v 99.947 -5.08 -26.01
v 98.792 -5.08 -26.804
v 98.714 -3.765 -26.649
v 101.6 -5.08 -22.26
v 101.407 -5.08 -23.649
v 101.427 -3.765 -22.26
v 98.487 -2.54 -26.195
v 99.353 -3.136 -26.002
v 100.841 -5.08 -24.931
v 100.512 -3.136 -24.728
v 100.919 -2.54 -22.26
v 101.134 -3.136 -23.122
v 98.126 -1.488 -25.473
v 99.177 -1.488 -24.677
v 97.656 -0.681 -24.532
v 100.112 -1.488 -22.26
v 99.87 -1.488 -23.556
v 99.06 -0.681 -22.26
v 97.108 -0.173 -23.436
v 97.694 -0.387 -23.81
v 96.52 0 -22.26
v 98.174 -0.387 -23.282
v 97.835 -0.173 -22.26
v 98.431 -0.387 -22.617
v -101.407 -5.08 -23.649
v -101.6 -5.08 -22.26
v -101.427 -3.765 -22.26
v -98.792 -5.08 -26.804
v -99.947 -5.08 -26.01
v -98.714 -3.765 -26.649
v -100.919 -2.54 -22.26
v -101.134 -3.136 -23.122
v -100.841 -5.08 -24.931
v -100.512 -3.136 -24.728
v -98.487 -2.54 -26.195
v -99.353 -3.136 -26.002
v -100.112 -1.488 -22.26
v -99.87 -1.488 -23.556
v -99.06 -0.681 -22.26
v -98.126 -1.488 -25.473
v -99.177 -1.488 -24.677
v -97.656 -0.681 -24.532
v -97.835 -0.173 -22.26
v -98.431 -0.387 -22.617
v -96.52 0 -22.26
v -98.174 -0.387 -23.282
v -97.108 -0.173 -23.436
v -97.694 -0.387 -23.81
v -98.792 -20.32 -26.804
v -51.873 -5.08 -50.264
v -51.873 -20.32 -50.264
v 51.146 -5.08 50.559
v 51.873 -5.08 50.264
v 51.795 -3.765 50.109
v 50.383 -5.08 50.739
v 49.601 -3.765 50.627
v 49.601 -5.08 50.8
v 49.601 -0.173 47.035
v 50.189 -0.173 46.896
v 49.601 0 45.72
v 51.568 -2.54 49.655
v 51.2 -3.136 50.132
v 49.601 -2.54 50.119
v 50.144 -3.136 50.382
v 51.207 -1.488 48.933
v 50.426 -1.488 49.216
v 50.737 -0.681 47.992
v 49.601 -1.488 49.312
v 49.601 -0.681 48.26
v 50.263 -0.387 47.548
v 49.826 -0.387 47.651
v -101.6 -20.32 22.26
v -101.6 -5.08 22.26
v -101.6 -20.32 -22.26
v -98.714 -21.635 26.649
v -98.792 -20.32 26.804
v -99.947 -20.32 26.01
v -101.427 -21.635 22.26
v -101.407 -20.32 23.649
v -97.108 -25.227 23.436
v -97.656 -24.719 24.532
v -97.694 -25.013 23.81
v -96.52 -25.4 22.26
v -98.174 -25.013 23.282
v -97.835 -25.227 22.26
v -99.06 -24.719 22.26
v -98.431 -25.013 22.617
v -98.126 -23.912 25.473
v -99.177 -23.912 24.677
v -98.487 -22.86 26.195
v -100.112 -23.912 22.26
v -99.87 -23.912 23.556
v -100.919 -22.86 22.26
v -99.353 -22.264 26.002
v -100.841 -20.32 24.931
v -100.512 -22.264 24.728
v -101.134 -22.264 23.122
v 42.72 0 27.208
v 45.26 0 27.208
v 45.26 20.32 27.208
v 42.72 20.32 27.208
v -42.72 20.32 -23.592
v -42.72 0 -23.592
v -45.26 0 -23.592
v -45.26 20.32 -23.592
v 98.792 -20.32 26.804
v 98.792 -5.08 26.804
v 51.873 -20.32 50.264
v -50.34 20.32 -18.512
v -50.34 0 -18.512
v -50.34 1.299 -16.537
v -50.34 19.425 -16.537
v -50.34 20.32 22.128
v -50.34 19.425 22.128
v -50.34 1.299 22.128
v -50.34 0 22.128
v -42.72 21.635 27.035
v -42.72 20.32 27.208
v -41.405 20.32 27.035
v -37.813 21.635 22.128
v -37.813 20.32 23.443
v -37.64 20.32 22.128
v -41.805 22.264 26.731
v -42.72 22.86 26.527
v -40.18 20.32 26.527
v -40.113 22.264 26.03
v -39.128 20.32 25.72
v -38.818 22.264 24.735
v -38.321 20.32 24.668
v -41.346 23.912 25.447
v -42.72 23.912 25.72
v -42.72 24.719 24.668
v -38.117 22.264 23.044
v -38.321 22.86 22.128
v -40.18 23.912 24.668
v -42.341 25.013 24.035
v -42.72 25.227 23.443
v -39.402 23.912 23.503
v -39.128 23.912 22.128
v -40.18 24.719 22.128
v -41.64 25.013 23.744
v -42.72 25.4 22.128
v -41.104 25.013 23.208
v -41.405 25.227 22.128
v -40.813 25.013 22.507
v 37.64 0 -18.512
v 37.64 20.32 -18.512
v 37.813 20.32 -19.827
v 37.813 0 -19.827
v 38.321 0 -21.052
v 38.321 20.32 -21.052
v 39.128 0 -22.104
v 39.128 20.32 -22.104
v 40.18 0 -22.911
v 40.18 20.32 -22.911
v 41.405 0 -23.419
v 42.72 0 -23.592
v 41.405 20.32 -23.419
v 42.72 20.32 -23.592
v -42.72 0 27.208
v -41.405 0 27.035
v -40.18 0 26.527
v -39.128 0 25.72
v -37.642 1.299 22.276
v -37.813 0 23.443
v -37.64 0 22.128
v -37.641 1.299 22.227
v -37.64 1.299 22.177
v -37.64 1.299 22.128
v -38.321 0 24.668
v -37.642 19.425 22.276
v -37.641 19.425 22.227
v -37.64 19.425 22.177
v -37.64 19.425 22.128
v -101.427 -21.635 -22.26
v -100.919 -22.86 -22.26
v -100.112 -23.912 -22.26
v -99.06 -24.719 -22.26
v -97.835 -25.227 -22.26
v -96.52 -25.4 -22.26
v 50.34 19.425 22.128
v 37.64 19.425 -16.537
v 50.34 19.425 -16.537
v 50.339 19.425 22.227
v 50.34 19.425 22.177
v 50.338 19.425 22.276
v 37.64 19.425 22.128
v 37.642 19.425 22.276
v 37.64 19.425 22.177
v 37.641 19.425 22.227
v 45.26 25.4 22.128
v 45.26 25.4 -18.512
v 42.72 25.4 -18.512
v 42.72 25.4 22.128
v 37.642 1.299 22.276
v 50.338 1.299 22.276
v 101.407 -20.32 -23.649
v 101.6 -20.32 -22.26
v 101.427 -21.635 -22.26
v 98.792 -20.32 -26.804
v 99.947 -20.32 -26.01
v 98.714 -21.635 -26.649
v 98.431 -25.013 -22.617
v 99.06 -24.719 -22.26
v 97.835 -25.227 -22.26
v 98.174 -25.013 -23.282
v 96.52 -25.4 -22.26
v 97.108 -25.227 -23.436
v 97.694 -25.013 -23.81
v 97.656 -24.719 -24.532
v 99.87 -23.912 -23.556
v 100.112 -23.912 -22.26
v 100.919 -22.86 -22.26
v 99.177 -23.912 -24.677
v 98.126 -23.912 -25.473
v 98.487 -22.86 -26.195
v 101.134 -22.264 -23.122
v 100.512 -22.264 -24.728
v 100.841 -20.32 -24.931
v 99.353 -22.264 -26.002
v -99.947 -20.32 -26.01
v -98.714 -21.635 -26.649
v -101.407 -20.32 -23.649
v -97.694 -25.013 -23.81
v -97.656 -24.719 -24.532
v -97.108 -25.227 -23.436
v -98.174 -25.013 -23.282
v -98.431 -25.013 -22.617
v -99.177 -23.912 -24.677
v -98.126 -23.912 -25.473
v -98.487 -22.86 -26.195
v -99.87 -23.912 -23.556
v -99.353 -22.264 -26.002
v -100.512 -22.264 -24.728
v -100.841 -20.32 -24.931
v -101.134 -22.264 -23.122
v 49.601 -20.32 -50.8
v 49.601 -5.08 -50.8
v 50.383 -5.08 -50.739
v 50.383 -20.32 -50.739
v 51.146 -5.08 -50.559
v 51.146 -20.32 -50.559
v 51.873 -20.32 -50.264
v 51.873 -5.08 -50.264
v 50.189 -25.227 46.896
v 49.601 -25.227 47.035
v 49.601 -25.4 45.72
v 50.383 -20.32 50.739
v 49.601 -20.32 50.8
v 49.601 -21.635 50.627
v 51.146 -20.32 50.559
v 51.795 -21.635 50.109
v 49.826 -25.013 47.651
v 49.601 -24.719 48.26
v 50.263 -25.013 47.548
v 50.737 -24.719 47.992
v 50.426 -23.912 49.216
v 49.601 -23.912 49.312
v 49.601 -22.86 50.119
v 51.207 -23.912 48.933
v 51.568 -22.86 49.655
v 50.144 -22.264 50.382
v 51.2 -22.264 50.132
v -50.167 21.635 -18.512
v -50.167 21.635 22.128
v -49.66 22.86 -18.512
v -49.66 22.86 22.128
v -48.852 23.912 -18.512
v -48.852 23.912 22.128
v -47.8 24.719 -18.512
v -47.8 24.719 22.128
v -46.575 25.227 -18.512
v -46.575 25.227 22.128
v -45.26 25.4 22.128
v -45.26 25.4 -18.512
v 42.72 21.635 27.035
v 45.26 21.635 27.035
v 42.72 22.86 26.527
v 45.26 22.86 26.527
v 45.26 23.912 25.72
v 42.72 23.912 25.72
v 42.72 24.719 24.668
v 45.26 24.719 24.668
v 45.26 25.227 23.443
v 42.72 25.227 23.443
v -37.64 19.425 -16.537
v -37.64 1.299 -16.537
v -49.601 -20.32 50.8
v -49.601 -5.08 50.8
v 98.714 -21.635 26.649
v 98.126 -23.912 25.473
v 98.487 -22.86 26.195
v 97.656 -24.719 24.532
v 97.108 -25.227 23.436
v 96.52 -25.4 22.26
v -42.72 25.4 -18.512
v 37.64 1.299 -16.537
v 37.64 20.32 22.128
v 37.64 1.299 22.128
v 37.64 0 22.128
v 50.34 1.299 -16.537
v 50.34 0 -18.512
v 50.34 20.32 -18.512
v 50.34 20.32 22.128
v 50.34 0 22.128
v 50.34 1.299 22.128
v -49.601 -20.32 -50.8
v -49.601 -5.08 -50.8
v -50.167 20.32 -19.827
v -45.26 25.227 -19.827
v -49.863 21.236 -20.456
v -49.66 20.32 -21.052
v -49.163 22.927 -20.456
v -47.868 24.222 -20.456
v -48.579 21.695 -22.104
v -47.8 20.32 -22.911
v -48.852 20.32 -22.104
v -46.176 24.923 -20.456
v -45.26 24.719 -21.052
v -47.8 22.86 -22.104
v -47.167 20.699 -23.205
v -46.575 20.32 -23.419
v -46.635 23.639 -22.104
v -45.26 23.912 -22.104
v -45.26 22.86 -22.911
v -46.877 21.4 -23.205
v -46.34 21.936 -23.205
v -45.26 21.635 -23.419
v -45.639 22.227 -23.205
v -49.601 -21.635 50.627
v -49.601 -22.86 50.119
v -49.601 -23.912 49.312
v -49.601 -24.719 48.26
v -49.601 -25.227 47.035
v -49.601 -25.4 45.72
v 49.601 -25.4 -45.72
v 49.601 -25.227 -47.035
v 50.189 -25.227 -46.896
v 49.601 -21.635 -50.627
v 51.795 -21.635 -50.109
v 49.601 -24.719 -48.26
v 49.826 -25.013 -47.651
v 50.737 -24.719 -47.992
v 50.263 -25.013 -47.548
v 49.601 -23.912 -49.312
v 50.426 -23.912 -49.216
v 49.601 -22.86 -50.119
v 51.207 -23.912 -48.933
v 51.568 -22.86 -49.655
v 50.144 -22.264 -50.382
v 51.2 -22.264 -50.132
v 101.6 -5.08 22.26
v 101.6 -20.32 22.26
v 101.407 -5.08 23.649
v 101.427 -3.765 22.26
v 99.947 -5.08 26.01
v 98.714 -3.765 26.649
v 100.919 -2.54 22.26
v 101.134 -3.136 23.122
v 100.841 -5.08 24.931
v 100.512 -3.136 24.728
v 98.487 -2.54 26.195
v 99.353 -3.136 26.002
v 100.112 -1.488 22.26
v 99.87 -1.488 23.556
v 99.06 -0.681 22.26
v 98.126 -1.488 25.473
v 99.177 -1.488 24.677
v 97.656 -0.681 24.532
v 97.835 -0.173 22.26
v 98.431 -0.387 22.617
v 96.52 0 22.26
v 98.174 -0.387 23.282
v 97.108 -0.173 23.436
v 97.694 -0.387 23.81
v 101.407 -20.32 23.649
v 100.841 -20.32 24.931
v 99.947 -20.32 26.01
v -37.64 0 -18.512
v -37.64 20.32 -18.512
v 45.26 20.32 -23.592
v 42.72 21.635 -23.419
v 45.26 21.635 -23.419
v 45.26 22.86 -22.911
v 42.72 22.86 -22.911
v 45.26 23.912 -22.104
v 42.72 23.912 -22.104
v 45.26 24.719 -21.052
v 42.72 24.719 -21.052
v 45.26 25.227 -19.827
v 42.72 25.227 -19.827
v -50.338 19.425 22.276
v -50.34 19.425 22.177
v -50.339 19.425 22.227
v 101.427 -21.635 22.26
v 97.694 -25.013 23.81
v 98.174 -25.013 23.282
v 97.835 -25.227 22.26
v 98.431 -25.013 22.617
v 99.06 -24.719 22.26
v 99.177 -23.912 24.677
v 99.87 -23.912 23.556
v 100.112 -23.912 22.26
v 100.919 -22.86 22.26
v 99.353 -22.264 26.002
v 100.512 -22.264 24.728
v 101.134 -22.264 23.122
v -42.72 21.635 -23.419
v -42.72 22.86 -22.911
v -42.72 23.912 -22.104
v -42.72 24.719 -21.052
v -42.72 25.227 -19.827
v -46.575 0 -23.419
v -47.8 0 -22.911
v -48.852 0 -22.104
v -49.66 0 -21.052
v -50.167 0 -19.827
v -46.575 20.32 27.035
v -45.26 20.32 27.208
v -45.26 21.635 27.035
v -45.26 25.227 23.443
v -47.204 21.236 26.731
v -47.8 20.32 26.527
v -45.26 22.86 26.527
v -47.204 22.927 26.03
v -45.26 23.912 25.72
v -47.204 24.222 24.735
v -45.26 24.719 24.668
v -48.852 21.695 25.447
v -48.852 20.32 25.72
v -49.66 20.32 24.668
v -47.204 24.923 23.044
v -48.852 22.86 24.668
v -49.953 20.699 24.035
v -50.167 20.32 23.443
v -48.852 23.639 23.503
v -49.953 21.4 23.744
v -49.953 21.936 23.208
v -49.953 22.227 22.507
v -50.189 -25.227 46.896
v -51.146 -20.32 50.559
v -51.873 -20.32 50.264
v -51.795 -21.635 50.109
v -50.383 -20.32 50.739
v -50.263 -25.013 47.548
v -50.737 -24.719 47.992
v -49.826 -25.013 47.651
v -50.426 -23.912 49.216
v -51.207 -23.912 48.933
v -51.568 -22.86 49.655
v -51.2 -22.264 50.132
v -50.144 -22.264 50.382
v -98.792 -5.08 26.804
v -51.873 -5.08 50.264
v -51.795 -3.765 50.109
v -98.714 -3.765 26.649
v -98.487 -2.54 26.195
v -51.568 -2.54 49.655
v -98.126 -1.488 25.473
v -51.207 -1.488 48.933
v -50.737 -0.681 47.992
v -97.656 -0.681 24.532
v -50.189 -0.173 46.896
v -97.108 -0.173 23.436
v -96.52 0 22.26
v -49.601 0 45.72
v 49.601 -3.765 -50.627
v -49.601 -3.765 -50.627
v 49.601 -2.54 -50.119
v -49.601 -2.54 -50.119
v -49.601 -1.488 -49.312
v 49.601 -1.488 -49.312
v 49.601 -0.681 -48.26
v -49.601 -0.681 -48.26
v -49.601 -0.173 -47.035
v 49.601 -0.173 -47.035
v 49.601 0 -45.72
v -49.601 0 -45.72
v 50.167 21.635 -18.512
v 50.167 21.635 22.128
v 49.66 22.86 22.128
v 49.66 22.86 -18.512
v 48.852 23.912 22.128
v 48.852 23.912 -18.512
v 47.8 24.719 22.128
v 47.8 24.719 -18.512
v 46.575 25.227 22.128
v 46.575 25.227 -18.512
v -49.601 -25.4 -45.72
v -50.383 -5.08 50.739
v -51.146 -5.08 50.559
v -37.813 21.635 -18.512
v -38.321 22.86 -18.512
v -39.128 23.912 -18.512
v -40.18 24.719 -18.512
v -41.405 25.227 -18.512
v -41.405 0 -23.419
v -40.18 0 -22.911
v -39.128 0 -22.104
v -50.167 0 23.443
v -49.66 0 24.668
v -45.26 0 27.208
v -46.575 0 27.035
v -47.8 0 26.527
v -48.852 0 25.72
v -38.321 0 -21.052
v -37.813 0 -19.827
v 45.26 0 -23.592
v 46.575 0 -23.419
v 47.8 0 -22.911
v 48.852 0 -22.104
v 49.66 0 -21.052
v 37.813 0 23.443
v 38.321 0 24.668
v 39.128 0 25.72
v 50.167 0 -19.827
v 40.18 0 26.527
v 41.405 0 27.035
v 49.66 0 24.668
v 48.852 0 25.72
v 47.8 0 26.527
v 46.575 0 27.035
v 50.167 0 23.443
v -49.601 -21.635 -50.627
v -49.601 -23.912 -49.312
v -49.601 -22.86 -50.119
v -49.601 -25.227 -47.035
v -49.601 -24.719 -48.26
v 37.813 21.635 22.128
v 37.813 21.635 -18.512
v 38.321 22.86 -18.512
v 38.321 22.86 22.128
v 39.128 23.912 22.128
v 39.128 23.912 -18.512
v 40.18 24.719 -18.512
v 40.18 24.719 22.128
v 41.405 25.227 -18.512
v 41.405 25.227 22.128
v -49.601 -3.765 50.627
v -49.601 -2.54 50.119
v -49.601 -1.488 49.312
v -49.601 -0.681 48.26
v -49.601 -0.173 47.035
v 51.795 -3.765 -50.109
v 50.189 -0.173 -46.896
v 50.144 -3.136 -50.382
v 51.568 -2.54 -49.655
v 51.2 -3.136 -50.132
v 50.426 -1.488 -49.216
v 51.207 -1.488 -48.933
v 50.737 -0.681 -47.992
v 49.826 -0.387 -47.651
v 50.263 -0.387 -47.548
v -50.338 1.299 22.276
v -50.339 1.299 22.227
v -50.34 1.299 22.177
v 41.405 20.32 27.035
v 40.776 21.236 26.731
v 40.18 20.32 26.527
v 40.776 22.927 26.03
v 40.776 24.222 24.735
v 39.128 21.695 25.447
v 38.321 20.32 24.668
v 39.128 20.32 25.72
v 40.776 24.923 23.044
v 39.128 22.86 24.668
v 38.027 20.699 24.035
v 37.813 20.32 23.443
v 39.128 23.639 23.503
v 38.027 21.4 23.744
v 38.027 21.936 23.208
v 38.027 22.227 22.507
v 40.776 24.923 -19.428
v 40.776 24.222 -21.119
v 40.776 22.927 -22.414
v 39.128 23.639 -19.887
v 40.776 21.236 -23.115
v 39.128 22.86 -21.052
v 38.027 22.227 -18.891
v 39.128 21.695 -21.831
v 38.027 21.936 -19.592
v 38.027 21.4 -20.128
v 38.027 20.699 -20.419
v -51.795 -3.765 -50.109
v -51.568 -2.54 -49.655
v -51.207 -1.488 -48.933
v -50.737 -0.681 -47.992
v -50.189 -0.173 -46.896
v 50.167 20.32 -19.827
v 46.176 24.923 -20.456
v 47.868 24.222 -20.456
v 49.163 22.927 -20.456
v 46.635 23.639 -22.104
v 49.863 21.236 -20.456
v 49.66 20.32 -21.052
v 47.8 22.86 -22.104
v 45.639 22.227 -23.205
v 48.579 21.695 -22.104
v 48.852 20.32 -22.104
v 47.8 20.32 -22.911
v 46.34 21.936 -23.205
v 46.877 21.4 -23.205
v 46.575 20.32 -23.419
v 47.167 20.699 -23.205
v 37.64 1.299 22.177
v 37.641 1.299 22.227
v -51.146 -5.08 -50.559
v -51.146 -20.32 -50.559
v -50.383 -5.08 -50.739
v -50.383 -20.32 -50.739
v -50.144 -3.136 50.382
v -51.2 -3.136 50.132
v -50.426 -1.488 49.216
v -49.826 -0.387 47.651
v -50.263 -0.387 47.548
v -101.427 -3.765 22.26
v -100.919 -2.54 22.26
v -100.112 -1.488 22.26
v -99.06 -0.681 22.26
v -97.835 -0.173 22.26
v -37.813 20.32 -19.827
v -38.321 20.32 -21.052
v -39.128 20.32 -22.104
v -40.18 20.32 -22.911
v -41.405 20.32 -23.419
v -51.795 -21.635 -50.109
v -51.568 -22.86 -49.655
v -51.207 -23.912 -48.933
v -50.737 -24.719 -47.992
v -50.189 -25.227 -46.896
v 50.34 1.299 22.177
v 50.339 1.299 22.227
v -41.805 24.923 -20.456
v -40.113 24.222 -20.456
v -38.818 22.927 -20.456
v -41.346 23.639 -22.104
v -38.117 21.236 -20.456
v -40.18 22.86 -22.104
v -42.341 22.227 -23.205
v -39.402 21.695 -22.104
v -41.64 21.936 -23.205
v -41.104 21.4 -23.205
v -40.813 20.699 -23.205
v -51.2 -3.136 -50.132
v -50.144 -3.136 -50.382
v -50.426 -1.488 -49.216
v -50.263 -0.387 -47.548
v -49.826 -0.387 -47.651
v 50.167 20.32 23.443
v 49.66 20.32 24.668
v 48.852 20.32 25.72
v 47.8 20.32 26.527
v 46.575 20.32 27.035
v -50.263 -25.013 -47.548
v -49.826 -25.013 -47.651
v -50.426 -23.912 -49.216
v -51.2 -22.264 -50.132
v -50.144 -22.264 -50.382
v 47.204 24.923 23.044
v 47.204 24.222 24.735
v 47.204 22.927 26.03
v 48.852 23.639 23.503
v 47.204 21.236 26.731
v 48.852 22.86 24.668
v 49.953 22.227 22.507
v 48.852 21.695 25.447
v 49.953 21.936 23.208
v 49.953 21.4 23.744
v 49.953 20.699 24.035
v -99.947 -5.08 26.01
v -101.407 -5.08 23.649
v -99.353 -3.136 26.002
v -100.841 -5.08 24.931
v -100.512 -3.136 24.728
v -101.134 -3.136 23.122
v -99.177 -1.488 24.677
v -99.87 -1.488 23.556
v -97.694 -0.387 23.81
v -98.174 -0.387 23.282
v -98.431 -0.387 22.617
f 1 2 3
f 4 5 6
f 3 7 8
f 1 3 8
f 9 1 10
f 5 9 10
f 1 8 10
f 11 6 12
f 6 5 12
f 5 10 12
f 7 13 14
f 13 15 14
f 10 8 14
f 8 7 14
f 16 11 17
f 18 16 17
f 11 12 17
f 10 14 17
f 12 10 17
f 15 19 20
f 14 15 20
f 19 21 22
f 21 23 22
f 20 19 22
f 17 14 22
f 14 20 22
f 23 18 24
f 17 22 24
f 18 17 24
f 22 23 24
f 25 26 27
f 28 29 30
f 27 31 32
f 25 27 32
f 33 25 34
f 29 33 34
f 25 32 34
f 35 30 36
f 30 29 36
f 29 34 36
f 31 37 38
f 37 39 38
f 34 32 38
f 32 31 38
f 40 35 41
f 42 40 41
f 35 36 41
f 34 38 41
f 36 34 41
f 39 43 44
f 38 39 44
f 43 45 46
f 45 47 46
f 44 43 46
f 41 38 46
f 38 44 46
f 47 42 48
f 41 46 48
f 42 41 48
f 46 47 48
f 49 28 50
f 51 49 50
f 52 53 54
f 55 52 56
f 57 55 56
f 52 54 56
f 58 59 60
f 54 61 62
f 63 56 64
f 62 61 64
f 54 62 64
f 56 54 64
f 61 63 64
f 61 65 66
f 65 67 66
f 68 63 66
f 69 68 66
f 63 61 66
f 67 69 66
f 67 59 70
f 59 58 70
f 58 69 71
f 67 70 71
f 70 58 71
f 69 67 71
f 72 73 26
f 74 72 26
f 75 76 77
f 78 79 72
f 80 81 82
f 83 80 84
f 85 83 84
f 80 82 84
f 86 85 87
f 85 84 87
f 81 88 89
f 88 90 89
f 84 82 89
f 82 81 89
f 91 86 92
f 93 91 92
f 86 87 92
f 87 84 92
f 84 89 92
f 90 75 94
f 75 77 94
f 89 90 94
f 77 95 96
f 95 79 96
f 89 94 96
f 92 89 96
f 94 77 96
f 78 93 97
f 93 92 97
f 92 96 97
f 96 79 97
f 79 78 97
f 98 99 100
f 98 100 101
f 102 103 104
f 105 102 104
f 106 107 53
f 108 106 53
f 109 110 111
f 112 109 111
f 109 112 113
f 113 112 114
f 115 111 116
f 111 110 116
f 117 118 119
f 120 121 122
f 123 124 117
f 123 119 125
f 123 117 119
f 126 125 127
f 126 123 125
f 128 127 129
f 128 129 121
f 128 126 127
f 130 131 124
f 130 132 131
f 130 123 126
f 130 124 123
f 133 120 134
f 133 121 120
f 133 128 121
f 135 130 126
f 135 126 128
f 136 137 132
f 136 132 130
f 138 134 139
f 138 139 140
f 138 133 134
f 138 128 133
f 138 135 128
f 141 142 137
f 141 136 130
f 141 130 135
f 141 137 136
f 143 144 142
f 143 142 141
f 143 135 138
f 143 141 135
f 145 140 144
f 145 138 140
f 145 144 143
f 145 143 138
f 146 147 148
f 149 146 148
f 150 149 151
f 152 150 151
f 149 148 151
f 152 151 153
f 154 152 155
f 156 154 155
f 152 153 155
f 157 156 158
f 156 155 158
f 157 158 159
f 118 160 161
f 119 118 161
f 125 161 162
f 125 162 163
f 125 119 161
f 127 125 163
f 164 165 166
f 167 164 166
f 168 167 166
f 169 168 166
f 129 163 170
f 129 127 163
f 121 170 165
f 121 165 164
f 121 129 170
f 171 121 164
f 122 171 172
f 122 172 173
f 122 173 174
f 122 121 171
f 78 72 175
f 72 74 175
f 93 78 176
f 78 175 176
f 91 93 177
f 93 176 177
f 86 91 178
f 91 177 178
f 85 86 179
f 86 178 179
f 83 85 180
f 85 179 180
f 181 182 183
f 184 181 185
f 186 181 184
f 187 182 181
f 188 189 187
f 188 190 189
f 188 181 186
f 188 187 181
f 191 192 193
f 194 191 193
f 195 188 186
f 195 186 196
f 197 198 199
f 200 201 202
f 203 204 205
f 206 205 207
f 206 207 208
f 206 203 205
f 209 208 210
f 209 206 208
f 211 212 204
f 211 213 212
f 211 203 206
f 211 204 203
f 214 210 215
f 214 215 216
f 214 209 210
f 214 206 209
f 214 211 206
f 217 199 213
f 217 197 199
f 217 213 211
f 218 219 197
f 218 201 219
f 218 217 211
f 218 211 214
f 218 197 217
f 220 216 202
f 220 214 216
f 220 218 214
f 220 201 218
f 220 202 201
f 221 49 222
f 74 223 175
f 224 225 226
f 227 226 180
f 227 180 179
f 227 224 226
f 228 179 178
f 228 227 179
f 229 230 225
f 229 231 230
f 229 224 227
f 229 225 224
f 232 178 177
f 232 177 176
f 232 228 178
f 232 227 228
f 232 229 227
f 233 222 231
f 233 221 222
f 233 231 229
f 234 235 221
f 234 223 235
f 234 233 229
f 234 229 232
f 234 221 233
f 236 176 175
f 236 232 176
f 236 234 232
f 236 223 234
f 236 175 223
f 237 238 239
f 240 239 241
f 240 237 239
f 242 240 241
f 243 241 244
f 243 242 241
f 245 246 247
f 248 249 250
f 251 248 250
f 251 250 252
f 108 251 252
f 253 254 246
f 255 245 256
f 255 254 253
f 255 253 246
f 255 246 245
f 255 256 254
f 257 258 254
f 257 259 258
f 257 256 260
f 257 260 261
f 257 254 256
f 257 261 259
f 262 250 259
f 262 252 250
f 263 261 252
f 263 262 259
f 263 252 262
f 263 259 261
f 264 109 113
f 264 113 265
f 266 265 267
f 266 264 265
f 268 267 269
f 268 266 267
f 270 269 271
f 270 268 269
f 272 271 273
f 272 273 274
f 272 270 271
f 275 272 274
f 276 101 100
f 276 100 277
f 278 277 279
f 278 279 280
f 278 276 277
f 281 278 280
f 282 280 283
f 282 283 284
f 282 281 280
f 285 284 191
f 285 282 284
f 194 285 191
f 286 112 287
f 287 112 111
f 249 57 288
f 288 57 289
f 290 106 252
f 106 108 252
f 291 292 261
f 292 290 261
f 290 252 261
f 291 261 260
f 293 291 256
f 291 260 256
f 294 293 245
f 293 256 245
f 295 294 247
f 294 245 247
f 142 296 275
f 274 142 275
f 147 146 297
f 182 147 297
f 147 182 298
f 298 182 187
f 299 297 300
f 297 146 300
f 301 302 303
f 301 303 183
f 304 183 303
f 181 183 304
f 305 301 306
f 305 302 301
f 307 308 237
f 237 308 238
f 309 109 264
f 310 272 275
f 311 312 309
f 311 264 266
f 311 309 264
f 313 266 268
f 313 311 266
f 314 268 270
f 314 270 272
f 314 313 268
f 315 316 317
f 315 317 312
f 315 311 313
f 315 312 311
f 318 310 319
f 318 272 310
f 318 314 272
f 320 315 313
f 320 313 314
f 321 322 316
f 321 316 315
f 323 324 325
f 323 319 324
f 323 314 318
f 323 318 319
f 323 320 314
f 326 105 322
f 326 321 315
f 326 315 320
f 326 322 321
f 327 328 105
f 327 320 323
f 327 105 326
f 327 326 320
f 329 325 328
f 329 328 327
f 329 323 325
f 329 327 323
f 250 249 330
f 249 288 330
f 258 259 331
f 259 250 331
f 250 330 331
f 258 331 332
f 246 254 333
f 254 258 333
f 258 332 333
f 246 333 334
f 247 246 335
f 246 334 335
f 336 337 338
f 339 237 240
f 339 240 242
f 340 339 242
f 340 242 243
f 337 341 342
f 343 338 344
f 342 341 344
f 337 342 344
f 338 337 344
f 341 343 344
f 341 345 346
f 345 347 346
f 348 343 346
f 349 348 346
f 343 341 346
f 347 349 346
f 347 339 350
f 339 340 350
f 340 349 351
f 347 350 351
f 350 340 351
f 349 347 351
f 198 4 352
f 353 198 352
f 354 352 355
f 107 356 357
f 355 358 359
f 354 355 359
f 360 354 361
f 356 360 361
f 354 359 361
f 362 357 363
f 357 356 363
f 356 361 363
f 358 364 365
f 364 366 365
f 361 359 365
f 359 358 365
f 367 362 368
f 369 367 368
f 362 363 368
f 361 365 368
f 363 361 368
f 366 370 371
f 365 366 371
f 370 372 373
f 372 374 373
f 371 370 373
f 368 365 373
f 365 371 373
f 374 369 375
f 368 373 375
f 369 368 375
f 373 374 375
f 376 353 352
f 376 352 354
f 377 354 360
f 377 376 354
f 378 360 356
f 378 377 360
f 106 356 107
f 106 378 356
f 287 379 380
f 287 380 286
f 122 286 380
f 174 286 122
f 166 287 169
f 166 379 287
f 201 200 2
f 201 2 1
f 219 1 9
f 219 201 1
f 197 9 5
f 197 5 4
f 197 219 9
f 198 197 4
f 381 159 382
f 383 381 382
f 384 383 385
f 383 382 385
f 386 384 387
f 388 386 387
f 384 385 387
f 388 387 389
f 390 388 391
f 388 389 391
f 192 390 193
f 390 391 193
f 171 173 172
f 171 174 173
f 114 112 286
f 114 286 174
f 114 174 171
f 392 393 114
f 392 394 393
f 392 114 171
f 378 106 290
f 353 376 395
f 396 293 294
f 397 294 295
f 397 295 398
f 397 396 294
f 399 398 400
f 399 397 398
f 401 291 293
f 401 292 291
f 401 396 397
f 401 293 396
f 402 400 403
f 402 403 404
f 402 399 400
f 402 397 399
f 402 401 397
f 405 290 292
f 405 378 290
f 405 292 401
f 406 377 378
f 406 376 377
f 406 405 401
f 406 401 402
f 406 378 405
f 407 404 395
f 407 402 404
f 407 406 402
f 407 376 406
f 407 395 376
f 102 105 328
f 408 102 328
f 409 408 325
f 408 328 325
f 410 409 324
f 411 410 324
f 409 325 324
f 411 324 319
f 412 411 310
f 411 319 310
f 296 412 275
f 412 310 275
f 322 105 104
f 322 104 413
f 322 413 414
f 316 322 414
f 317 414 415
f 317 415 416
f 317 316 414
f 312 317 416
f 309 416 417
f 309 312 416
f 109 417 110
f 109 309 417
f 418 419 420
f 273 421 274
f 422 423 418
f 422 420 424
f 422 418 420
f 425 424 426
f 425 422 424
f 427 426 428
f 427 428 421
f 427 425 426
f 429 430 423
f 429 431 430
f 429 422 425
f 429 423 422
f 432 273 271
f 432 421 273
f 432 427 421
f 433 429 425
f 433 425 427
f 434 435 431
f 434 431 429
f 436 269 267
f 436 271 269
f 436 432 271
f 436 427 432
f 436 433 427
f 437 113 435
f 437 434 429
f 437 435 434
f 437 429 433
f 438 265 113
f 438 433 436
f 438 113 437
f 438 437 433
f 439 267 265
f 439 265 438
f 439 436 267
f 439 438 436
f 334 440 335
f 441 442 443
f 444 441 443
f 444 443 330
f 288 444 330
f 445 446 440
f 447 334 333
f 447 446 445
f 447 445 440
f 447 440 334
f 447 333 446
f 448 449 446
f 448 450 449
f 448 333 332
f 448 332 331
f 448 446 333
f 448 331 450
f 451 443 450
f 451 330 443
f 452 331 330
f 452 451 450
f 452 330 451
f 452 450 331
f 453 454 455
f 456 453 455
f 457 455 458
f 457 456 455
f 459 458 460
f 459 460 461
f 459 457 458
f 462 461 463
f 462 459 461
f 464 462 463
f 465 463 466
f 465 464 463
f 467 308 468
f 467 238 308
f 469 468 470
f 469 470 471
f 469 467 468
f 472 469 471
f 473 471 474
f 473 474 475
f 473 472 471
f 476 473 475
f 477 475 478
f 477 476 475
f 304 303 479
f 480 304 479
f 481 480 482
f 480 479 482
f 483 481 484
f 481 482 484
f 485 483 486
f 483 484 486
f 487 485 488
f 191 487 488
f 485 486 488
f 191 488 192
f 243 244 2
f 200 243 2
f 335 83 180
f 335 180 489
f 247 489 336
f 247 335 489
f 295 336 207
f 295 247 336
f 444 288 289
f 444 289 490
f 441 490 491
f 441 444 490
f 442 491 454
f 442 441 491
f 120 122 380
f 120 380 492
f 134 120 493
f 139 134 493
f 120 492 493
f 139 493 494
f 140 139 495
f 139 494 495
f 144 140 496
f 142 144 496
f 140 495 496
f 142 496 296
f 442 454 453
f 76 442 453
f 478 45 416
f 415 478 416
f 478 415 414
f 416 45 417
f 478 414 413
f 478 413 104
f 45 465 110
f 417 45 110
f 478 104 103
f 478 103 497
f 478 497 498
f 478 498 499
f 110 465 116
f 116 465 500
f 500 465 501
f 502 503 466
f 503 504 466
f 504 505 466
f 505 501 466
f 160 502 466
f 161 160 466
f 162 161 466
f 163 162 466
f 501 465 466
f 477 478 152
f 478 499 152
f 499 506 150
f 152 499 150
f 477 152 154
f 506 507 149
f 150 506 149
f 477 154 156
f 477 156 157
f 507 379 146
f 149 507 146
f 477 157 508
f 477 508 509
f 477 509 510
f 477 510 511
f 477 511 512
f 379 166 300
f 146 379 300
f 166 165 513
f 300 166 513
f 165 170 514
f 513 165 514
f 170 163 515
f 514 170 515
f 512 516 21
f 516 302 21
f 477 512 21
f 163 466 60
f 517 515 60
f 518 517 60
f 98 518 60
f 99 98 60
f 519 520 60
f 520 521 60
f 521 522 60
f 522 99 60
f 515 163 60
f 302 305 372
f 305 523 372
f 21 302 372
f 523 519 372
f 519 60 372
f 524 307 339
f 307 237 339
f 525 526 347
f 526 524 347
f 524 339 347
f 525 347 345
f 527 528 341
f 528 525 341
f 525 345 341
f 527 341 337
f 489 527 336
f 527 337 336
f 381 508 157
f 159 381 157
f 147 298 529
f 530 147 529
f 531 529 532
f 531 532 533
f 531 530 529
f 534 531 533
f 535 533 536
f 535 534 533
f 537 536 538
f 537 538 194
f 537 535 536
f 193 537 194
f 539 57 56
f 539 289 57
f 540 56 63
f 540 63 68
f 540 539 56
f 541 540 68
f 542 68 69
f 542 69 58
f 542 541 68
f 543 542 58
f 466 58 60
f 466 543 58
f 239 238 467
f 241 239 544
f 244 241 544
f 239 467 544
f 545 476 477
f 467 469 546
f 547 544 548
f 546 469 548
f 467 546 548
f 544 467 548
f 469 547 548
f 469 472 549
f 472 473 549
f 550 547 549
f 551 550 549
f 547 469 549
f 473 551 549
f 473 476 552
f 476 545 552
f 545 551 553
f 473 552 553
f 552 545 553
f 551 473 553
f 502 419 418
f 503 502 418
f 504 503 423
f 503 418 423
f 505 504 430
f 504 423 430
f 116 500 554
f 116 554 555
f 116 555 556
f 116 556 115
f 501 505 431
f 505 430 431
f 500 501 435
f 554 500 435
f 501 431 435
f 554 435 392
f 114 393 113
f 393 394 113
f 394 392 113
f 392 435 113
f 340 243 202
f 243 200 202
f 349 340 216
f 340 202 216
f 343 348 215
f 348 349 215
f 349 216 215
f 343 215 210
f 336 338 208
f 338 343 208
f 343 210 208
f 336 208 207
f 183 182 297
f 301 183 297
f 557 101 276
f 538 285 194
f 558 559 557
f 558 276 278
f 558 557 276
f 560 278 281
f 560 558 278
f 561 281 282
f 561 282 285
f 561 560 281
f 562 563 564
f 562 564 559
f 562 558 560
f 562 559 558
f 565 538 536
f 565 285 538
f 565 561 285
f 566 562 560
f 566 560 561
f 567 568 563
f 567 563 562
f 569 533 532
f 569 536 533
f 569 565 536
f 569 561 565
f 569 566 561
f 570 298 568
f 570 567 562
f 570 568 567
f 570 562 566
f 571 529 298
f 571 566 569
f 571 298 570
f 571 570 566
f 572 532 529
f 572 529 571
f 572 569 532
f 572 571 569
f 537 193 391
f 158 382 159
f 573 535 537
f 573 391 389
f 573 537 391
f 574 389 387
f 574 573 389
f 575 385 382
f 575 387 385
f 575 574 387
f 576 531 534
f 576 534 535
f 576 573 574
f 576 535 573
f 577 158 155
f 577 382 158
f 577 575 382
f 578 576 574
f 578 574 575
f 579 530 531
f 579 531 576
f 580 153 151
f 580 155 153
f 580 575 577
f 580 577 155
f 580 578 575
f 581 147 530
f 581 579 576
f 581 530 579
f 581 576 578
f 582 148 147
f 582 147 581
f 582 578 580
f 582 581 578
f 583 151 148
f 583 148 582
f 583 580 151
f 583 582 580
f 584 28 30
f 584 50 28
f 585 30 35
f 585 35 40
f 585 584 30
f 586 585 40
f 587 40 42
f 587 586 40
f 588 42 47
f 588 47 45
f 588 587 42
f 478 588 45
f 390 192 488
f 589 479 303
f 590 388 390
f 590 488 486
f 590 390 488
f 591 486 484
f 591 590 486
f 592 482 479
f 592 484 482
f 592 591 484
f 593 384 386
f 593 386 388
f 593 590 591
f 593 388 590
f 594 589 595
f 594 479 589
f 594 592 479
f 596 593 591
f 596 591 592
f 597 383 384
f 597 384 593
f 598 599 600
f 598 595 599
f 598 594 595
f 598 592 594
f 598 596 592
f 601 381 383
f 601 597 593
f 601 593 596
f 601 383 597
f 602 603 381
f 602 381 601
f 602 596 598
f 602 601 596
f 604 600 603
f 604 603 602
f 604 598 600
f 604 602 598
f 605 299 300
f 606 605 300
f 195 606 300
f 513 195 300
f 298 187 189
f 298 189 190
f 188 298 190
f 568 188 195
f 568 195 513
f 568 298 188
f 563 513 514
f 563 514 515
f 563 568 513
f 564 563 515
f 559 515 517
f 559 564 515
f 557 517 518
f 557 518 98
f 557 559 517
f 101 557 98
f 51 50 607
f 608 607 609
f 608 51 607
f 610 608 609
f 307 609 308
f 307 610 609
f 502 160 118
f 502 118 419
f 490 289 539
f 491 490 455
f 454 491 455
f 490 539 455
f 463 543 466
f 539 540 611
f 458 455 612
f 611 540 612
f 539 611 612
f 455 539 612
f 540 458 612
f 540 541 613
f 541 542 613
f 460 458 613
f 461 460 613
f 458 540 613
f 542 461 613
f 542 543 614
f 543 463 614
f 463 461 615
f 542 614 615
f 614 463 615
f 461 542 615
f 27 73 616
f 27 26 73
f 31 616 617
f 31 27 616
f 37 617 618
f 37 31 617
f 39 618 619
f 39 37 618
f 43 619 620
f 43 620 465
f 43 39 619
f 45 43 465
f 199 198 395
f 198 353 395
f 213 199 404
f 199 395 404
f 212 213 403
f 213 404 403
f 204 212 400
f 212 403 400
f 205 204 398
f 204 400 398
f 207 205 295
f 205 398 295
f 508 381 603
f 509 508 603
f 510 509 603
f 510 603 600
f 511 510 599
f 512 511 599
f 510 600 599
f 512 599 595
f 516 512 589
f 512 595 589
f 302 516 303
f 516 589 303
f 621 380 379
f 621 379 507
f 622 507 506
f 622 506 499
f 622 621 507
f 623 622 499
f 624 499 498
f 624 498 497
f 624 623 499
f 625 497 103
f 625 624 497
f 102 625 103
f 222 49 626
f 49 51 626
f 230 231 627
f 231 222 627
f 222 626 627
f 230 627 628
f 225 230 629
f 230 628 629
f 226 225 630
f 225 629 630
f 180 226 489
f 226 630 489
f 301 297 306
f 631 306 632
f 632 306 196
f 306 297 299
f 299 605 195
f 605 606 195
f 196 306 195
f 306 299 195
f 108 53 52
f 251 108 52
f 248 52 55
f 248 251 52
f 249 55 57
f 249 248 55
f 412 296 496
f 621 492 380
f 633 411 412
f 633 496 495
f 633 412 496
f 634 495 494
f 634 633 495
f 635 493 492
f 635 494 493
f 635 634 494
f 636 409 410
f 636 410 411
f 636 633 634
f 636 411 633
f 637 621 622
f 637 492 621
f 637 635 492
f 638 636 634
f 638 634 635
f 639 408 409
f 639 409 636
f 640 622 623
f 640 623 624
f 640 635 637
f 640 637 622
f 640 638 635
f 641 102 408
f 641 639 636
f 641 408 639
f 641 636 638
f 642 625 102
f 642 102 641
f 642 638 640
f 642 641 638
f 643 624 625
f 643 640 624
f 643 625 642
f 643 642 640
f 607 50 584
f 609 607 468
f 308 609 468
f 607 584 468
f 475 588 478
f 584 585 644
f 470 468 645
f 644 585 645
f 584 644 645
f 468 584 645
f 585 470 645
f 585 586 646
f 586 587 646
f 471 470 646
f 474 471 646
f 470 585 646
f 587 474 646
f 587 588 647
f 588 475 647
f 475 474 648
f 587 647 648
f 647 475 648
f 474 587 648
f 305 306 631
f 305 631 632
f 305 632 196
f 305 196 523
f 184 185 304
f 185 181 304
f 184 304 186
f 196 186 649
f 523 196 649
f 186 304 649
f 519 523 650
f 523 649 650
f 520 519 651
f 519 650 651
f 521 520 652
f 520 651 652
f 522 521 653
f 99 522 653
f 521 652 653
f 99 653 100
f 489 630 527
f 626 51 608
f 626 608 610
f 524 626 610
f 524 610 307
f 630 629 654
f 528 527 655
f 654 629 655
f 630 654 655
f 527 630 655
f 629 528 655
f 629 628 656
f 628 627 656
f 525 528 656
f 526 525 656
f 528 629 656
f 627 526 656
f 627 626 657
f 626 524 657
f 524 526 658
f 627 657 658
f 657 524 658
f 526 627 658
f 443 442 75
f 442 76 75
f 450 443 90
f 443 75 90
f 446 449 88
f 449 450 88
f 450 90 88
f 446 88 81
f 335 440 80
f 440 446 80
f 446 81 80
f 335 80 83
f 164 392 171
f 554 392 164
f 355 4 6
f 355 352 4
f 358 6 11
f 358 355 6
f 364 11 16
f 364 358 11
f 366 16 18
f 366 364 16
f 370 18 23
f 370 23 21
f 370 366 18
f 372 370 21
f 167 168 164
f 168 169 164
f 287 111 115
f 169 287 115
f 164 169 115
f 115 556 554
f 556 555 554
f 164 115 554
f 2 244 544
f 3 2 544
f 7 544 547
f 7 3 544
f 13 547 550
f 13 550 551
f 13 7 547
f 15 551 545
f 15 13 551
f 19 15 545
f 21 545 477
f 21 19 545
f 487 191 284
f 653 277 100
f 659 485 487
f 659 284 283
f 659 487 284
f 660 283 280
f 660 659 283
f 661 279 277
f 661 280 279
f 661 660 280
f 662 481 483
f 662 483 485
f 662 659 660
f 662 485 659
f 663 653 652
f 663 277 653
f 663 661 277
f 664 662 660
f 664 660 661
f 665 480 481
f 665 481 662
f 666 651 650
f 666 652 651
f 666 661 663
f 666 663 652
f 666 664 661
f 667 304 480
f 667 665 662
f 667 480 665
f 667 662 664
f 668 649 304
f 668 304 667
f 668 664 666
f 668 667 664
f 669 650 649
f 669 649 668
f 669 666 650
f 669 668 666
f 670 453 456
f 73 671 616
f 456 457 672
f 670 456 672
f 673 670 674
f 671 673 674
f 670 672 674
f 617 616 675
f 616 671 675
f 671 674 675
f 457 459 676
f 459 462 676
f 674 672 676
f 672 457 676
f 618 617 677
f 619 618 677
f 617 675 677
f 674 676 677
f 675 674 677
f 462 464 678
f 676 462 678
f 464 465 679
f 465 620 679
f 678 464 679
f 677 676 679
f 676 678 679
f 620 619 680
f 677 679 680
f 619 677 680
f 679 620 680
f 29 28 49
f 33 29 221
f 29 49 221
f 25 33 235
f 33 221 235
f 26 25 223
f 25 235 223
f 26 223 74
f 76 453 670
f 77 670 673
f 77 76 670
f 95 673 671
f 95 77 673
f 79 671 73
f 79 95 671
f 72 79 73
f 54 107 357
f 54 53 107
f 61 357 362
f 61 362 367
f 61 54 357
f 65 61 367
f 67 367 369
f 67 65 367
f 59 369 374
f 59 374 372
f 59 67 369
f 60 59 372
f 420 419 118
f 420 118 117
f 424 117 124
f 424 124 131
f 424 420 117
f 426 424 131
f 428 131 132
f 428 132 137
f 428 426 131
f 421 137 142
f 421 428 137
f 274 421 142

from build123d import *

# Parameters (mm, degrees)
F1_DEPTH     = 25.4
F2_R         = 5.08
F3_R         = 5.08
F4_W         = 12.7
F4_H         = 50.8
F5_DEPTH     = 25.4
F6_W         = 18.1257220684
F6_H         = 38.8130061328
F7_DEPTH     = 254
F8_T1_DEPTH  = 2.54
F8_T3_DEPTH  = 40.64
F8_T5_DEPTH  = 20.32
F8_S9_W      = 5.08
F8_S9_H      = 5.08
F8_T10_DEPTH = 5.08
F8_S15_W     = 5.08
F8_S15_H     = 5.08
F8_T16_DEPTH = 5.08
F8_S21_W     = 5.08
F8_S21_H     = 5.08
F8_T22_DEPTH = 5.08
F8_S27_W     = 5.08
F8_S27_H     = 5.08
F8_T28_DEPTH = 5.08
F9_T1_DEPTH  = 40.64
F9_T3_DEPTH  = 2.54
F9_T5_DEPTH  = 20.32
F9_S9_W      = 5.08
F9_S9_H      = 5.08
F9_T10_DEPTH = 5.08
F9_S15_W     = 5.08
F9_S15_H     = 5.08
F9_T16_DEPTH = 5.08
F9_S21_W     = 5.08
F9_S21_H     = 5.08
F9_T22_DEPTH = 5.08
F9_S27_W     = 5.08
F9_S27_H     = 5.08
F9_T28_DEPTH = 5.08


# Not quite as in the source:
# - a fillet or chamfer that OpenCascade refuses, or shapes differently, is made with other operations: its cross-section is extruded or revolved along the edge and cut away or added


with BuildPart() as f1:
    # F0 (on Front) → F1 (new body)
    with BuildSketch(Plane.XZ):
        Polygon((-101.6, -25.4), (-50.8, -50.8), (50.8, -50.8), (101.6, -25.4), (101.6, 25.4), (50.8, 50.8), (-50.8, 50.8), (-101.6, 25.4), align=None)
    extrude(amount=F1_DEPTH)

    # F2
    f2_edges = [f1.edges().sort_by_distance(p)[0] for p in [
        (-76.2, -25.4, 38.1),
        (0, -25.4, 50.8),
        (76.2, -25.4, 38.1),
        (101.6, -25.4, 0),
        (-76.2, -25.4, -38.1),
        (0, -25.4, -50.8),
        (76.2, -25.4, -38.1),
        (-101.6, -25.4, 0),
        (-50.8, -12.7, -50.8),
        (-101.6, -12.7, -25.4),
        (-101.6, -12.7, 25.4),
        (-50.8, -12.7, 50.8),
        (50.8, -12.7, 50.8),
        (101.6, -12.7, 25.4),
        (101.6, -12.7, -25.4),
        (50.8, -12.7, -50.8),
    ]]
    fillet(f2_edges, radius=F2_R)

    # F3
    f3_edges = [f1.edges().sort_by_distance(p)[0] for p in [
        (-75.332232, 0, -38.533884),
        (-100.841306, 0, -24.931101),
        (-50.76792, 0, -50.664105),
        (-101.6, 0, 0),
        (0, 0, -50.8),
        (-100.841306, 0, 24.931101),
        (50.76792, 0, -50.664105),
        (-75.332232, 0, 38.533884),
        (75.332232, 0, -38.533884),
        (-50.76792, 0, 50.664105),
        (100.841306, 0, -24.931101),
        (0, 0, 50.8),
        (101.6, 0, 0),
        (50.76792, 0, 50.664105),
        (100.841306, 0, 24.931101),
        (75.332232, 0, 38.533884),
    ]]
    fillet(f3_edges, radius=F3_R)

    # F4 (on face) → F5 (join)
    with BuildSketch(Plane(origin=(0, 0, 0), x_dir=(-1, 0, 0), z_dir=(0, 1, 0))):
        with Locations((-43.9901705831, 1.8079679169)):
            Rectangle(F4_W, F4_H)
        with Locations((43.9901705831, 1.8079679169)):
            Rectangle(F4_W, F4_H)
    extrude(amount=F5_DEPTH)

    # F6 (on face) → F7 (cut)
    with BuildSketch(Plane(origin=(-50.3401705831, 0, 0), x_dir=(0, -1, 0), z_dir=(-1, 0, 0))):
        with Locations((-10.3619872243, 2.8695575893)):
            Rectangle(F6_W, F6_H)
    extrude(amount=-F7_DEPTH, mode=Mode.SUBTRACT)

    # F8: fillet of radius 5.08 on 8 edges, made by hand

    # F8_s2 → F8_t1 (cut)
    with BuildSketch(Plane.YZ.offset(42.7201705831)):
        with BuildLine():
            ThreePointArc((20.32, 27.2079679169), (23.9121024484, 25.7200703653), (25.4, 22.1279679169))
            Line((25.4, 22.1279679169), (25.4, 27.2079679169))
            Line((25.4, 27.2079679169), (20.32, 27.2079679169))
        make_face()
        with BuildLine():
            ThreePointArc((20.32, -23.5920320831), (23.9121024484, -22.1041345315), (25.4, -18.5120320831))
            Line((25.4, -18.5120320831), (25.4, -23.5920320831))
            Line((25.4, -23.5920320831), (20.32, -23.5920320831))
        make_face()
    extrude(amount=F8_T1_DEPTH, mode=Mode.SUBTRACT)

    # F8_s4 → F8_t3 (cut)
    with BuildSketch(Plane.XY.offset(-18.5120320831)):
        with BuildLine():
            ThreePointArc((50.3401705831, 20.32), (48.8522730316, 23.9121024484), (45.2601705831, 25.4))
            Line((45.2601705831, 25.4), (50.3401705831, 25.4))
            Line((50.3401705831, 25.4), (50.3401705831, 20.32))
        make_face()
        with BuildLine():
            ThreePointArc((37.6401705831, 20.32), (39.1280681347, 23.9121024484), (42.7201705831, 25.4))
            Line((42.7201705831, 25.4), (37.6401705831, 25.4))
            Line((37.6401705831, 25.4), (37.6401705831, 20.32))
        make_face()
    extrude(amount=F8_T3_DEPTH, mode=Mode.SUBTRACT)

    # F8_s6 → F8_t5 (cut)
    with BuildSketch(Plane.XZ.offset(-20.32)):
        with BuildLine():
            ThreePointArc((45.2601705831, -23.5920320831), (48.8522730316, -22.1041345315), (50.3401705831, -18.5120320831))
            Line((50.3401705831, -18.5120320831), (50.3401705831, -23.5920320831))
            Line((50.3401705831, -23.5920320831), (45.2601705831, -23.5920320831))
        make_face()
        with BuildLine():
            ThreePointArc((37.6401705831, -18.5120320831), (39.1280681347, -22.1041345315), (42.7201705831, -23.5920320831))
            Line((42.7201705831, -23.5920320831), (37.6401705831, -23.5920320831))
            Line((37.6401705831, -23.5920320831), (37.6401705831, -18.5120320831))
        make_face()
        with BuildLine():
            ThreePointArc((37.6401705831, 22.1279679169), (39.1280681347, 25.7200703653), (42.7201705831, 27.2079679169))
            Line((42.7201705831, 27.2079679169), (37.6401705831, 27.2079679169))
            Line((37.6401705831, 27.2079679169), (37.6401705831, 22.1279679169))
        make_face()
        with BuildLine():
            ThreePointArc((50.3401705831, 22.1279679169), (48.8522730316, 25.7200703653), (45.2601705831, 27.2079679169))
            Line((45.2601705831, 27.2079679169), (50.3401705831, 27.2079679169))
            Line((50.3401705831, 27.2079679169), (50.3401705831, 22.1279679169))
        make_face()
    extrude(amount=F8_T5_DEPTH, mode=Mode.SUBTRACT)


with BuildPart() as f8_tool8:
    # F8_s9 → F8_t10 (new body)
    with BuildSketch(Plane.YZ.offset(42.7201705831)):
        with Locations((22.86, 24.6679679169)):
            Rectangle(F8_S9_W, F8_S9_H)
    extrude(amount=-F8_T10_DEPTH)

    # F8_s11 → F8_t12 (revolve, cut)
    with BuildSketch(Plane(origin=(42.7201705831, 20.32, 22.1279679169), x_dir=(0, -0.7071067812, -0.7071067812), z_dir=(0, 0.7071067812, -0.7071067812))):
        with BuildLine():
            ThreePointArc((0, -5.08), (5.08, 0), (0, 5.08))
            Line((0, 5.08), (0, -5.08))
        make_face()
    revolve(axis=Axis((42.7201705831, 20.32, 22.1279679169), (-1, 0, 0)), mode=Mode.SUBTRACT)


with BuildPart() as f1_1:
    add(f1.part)

    # F8_t7: cut F8_tool8
    add(f8_tool8.part, mode=Mode.SUBTRACT)


with BuildPart() as f8_tool14:
    # F8_s15 → F8_t16 (new body)
    with BuildSketch(Plane.YZ.offset(45.2601705831)):
        with Locations((22.86, 24.6679679169)):
            Rectangle(F8_S15_W, F8_S15_H)
    extrude(amount=F8_T16_DEPTH)

    # F8_s17 → F8_t18 (revolve, cut)
    with BuildSketch(Plane(origin=(45.2601705831, 20.32, 22.1279679169), x_dir=(0, -0.7071067812, -0.7071067812), z_dir=(0, -0.7071067812, 0.7071067812))):
        with BuildLine():
            ThreePointArc((0, -5.08), (5.08, 0), (0, 5.08))
            Line((0, 5.08), (0, -5.08))
        make_face()
    revolve(axis=Axis((45.2601705831, 20.32, 22.1279679169), (1, 0, 0)), mode=Mode.SUBTRACT)


with BuildPart() as f1_2:
    add(f1_1.part)

    # F8_t13: cut F8_tool14
    add(f8_tool14.part, mode=Mode.SUBTRACT)


with BuildPart() as f8_tool20:
    # F8_s21 → F8_t22 (new body)
    with BuildSketch(Plane.XY.offset(-18.5120320831)):
        with Locations((47.8001705831, 22.86)):
            Rectangle(F8_S21_W, F8_S21_H)
    extrude(amount=-F8_T22_DEPTH)

    # F8_s23 → F8_t24 (revolve, cut)
    with BuildSketch(Plane(origin=(45.2601705831, 20.32, -18.5120320831), x_dir=(-0.7071067812, -0.7071067812, 0), z_dir=(0.7071067812, -0.7071067812, 0))):
        with BuildLine():
            ThreePointArc((0, -5.08), (5.08, 0), (0, 5.08))
            Line((0, 5.08), (0, -5.08))
        make_face()
    revolve(axis=Axis((45.2601705831, 20.32, -18.5120320831), (0, 0, -1)), mode=Mode.SUBTRACT)


with BuildPart() as f1_3:
    add(f1_2.part)

    # F8_t19: cut F8_tool20
    add(f8_tool20.part, mode=Mode.SUBTRACT)


with BuildPart() as f8_tool26:
    # F8_s27 → F8_t28 (new body)
    with BuildSketch(Plane.YZ.offset(42.7201705831)):
        with Locations((22.86, -21.0520320831)):
            Rectangle(F8_S27_W, F8_S27_H)
    extrude(amount=-F8_T28_DEPTH)

    # F8_s29 → F8_t30 (revolve, cut)
    with BuildSketch(Plane(origin=(42.7201705831, 20.32, -18.5120320831), x_dir=(0, -0.7071067812, 0.7071067812), z_dir=(0, -0.7071067812, -0.7071067812))):
        with BuildLine():
            ThreePointArc((0, -5.08), (5.08, 0), (0, 5.08))
            Line((0, 5.08), (0, -5.08))
        make_face()
    revolve(axis=Axis((42.7201705831, 20.32, -18.5120320831), (-1, 0, 0)), mode=Mode.SUBTRACT)


with BuildPart() as f1_4:
    add(f1_3.part)

    # F8_t25: cut F8_tool26
    add(f8_tool26.part, mode=Mode.SUBTRACT)

    # F9: fillet of radius 5.08 on 8 edges, made by hand

    # F9_s2 → F9_t1 (cut)
    with BuildSketch(Plane.XY.offset(-18.5120320831)):
        with BuildLine():
            ThreePointArc((-37.6401705831, 20.32), (-39.1280681347, 23.9121024484), (-42.7201705831, 25.4))
            Line((-42.7201705831, 25.4), (-37.6401705831, 25.4))
            Line((-37.6401705831, 25.4), (-37.6401705831, 20.32))
        make_face()
        with BuildLine():
            ThreePointArc((-50.3401705831, 20.32), (-48.8522730316, 23.9121024484), (-45.2601705831, 25.4))
            Line((-45.2601705831, 25.4), (-50.3401705831, 25.4))
            Line((-50.3401705831, 25.4), (-50.3401705831, 20.32))
        make_face()
    extrude(amount=F9_T1_DEPTH, mode=Mode.SUBTRACT)

    # F9_s4 → F9_t3 (cut)
    with BuildSketch(Plane.YZ.offset(-45.2601705831)):
        with BuildLine():
            ThreePointArc((20.32, -23.5920320831), (23.9121024484, -22.1041345315), (25.4, -18.5120320831))
            Line((25.4, -18.5120320831), (25.4, -23.5920320831))
            Line((25.4, -23.5920320831), (20.32, -23.5920320831))
        make_face()
        with BuildLine():
            ThreePointArc((20.32, 27.2079679169), (23.9121024484, 25.7200703653), (25.4, 22.1279679169))
            Line((25.4, 22.1279679169), (25.4, 27.2079679169))
            Line((25.4, 27.2079679169), (20.32, 27.2079679169))
        make_face()
    extrude(amount=F9_T3_DEPTH, mode=Mode.SUBTRACT)

    # F9_s6 → F9_t5 (cut)
    with BuildSketch(Plane.XZ.offset(-20.32)):
        with BuildLine():
            ThreePointArc((-37.6401705831, -18.5120320831), (-39.1280681347, -22.1041345315), (-42.7201705831, -23.5920320831))
            Line((-42.7201705831, -23.5920320831), (-37.6401705831, -23.5920320831))
            Line((-37.6401705831, -23.5920320831), (-37.6401705831, -18.5120320831))
        make_face()
        with BuildLine():
            ThreePointArc((-45.2601705831, -23.5920320831), (-48.8522730316, -22.1041345315), (-50.3401705831, -18.5120320831))
            Line((-50.3401705831, -18.5120320831), (-50.3401705831, -23.5920320831))
            Line((-50.3401705831, -23.5920320831), (-45.2601705831, -23.5920320831))
        make_face()
        with BuildLine():
            ThreePointArc((-42.7201705831, 27.2079679169), (-39.1280681347, 25.7200703653), (-37.6401705831, 22.1279679169))
            Line((-37.6401705831, 22.1279679169), (-37.6401705831, 27.2079679169))
            Line((-37.6401705831, 27.2079679169), (-42.7201705831, 27.2079679169))
        make_face()
        with BuildLine():
            ThreePointArc((-45.2601705831, 27.2079679169), (-48.8522730316, 25.7200703653), (-50.3401705831, 22.1279679169))
            Line((-50.3401705831, 22.1279679169), (-50.3401705831, 27.2079679169))
            Line((-50.3401705831, 27.2079679169), (-45.2601705831, 27.2079679169))
        make_face()
    extrude(amount=F9_T5_DEPTH, mode=Mode.SUBTRACT)


with BuildPart() as f9_tool8:
    # F9_s9 → F9_t10 (new body)
    with BuildSketch(Plane.XZ.offset(-20.32)):
        with Locations((-40.1801705831, 24.6679679169)):
            Rectangle(F9_S9_W, F9_S9_H)
    extrude(amount=-F9_T10_DEPTH)

    # F9_s11 → F9_t12 (revolve, cut)
    with BuildSketch(Plane(origin=(-42.7201705831, 20.32, 22.1279679169), x_dir=(-0.7071067812, 0, -0.7071067812), z_dir=(0.7071067812, 0, -0.7071067812))):
        with BuildLine():
            ThreePointArc((0, -5.08), (5.08, 0), (0, 5.08))
            Line((0, 5.08), (0, -5.08))
        make_face()
    revolve(axis=Axis((-42.7201705831, 20.32, 22.1279679169), (0, 1, 0)), mode=Mode.SUBTRACT)


with BuildPart() as f1_5:
    add(f1_4.part)

    # F9_t7: cut F9_tool8
    add(f9_tool8.part, mode=Mode.SUBTRACT)


with BuildPart() as f9_tool14:
    # F9_s15 → F9_t16 (new body)
    with BuildSketch(Plane.XY.offset(-18.5120320831)):
        with Locations((-40.1801705831, 22.86)):
            Rectangle(F9_S15_W, F9_S15_H)
    extrude(amount=-F9_T16_DEPTH)

    # F9_s17 → F9_t18 (revolve, cut)
    with BuildSketch(Plane(origin=(-42.7201705831, 20.32, -18.5120320831), x_dir=(-0.7071067812, -0.7071067812, 0), z_dir=(0.7071067812, -0.7071067812, 0))):
        with BuildLine():
            ThreePointArc((0, -5.08), (5.08, 0), (0, 5.08))
            Line((0, 5.08), (0, -5.08))
        make_face()
    revolve(axis=Axis((-42.7201705831, 20.32, -18.5120320831), (0, 0, -1)), mode=Mode.SUBTRACT)


with BuildPart() as f1_6:
    add(f1_5.part)

    # F9_t13: cut F9_tool14
    add(f9_tool14.part, mode=Mode.SUBTRACT)


with BuildPart() as f9_tool20:
    # F9_s21 → F9_t22 (new body)
    with BuildSketch(Plane.XY.offset(-18.5120320831)):
        with Locations((-47.8001705831, 22.86)):
            Rectangle(F9_S21_W, F9_S21_H)
    extrude(amount=-F9_T22_DEPTH)

    # F9_s23 → F9_t24 (revolve, cut)
    with BuildSketch(Plane(origin=(-45.2601705831, 20.32, -18.5120320831), x_dir=(0.7071067812, -0.7071067812, 0), z_dir=(0.7071067812, 0.7071067812, 0))):
        with BuildLine():
            ThreePointArc((0, -5.08), (5.08, 0), (0, 5.08))
            Line((0, 5.08), (0, -5.08))
        make_face()
    revolve(axis=Axis((-45.2601705831, 20.32, -18.5120320831), (0, 0, -1)), mode=Mode.SUBTRACT)


with BuildPart() as f1_7:
    add(f1_6.part)

    # F9_t19: cut F9_tool20
    add(f9_tool20.part, mode=Mode.SUBTRACT)


with BuildPart() as f9_tool26:
    # F9_s27 → F9_t28 (new body)
    with BuildSketch(Plane.YZ.offset(-45.2601705831)):
        with Locations((22.86, 24.6679679169)):
            Rectangle(F9_S27_W, F9_S27_H)
    extrude(amount=-F9_T28_DEPTH)

    # F9_s29 → F9_t30 (revolve, cut)
    with BuildSketch(Plane(origin=(-45.2601705831, 20.32, 22.1279679169), x_dir=(0, -0.7071067812, -0.7071067812), z_dir=(0, 0.7071067812, -0.7071067812))):
        with BuildLine():
            ThreePointArc((0, -5.08), (5.08, 0), (0, 5.08))
            Line((0, 5.08), (0, -5.08))
        make_face()
    revolve(axis=Axis((-45.2601705831, 20.32, 22.1279679169), (-1, 0, 0)), mode=Mode.SUBTRACT)


with BuildPart() as f1_8:
    add(f1_7.part)

    # F9_t25: cut F9_tool26
    add(f9_tool26.part, mode=Mode.SUBTRACT)


solid = f1_8.part
